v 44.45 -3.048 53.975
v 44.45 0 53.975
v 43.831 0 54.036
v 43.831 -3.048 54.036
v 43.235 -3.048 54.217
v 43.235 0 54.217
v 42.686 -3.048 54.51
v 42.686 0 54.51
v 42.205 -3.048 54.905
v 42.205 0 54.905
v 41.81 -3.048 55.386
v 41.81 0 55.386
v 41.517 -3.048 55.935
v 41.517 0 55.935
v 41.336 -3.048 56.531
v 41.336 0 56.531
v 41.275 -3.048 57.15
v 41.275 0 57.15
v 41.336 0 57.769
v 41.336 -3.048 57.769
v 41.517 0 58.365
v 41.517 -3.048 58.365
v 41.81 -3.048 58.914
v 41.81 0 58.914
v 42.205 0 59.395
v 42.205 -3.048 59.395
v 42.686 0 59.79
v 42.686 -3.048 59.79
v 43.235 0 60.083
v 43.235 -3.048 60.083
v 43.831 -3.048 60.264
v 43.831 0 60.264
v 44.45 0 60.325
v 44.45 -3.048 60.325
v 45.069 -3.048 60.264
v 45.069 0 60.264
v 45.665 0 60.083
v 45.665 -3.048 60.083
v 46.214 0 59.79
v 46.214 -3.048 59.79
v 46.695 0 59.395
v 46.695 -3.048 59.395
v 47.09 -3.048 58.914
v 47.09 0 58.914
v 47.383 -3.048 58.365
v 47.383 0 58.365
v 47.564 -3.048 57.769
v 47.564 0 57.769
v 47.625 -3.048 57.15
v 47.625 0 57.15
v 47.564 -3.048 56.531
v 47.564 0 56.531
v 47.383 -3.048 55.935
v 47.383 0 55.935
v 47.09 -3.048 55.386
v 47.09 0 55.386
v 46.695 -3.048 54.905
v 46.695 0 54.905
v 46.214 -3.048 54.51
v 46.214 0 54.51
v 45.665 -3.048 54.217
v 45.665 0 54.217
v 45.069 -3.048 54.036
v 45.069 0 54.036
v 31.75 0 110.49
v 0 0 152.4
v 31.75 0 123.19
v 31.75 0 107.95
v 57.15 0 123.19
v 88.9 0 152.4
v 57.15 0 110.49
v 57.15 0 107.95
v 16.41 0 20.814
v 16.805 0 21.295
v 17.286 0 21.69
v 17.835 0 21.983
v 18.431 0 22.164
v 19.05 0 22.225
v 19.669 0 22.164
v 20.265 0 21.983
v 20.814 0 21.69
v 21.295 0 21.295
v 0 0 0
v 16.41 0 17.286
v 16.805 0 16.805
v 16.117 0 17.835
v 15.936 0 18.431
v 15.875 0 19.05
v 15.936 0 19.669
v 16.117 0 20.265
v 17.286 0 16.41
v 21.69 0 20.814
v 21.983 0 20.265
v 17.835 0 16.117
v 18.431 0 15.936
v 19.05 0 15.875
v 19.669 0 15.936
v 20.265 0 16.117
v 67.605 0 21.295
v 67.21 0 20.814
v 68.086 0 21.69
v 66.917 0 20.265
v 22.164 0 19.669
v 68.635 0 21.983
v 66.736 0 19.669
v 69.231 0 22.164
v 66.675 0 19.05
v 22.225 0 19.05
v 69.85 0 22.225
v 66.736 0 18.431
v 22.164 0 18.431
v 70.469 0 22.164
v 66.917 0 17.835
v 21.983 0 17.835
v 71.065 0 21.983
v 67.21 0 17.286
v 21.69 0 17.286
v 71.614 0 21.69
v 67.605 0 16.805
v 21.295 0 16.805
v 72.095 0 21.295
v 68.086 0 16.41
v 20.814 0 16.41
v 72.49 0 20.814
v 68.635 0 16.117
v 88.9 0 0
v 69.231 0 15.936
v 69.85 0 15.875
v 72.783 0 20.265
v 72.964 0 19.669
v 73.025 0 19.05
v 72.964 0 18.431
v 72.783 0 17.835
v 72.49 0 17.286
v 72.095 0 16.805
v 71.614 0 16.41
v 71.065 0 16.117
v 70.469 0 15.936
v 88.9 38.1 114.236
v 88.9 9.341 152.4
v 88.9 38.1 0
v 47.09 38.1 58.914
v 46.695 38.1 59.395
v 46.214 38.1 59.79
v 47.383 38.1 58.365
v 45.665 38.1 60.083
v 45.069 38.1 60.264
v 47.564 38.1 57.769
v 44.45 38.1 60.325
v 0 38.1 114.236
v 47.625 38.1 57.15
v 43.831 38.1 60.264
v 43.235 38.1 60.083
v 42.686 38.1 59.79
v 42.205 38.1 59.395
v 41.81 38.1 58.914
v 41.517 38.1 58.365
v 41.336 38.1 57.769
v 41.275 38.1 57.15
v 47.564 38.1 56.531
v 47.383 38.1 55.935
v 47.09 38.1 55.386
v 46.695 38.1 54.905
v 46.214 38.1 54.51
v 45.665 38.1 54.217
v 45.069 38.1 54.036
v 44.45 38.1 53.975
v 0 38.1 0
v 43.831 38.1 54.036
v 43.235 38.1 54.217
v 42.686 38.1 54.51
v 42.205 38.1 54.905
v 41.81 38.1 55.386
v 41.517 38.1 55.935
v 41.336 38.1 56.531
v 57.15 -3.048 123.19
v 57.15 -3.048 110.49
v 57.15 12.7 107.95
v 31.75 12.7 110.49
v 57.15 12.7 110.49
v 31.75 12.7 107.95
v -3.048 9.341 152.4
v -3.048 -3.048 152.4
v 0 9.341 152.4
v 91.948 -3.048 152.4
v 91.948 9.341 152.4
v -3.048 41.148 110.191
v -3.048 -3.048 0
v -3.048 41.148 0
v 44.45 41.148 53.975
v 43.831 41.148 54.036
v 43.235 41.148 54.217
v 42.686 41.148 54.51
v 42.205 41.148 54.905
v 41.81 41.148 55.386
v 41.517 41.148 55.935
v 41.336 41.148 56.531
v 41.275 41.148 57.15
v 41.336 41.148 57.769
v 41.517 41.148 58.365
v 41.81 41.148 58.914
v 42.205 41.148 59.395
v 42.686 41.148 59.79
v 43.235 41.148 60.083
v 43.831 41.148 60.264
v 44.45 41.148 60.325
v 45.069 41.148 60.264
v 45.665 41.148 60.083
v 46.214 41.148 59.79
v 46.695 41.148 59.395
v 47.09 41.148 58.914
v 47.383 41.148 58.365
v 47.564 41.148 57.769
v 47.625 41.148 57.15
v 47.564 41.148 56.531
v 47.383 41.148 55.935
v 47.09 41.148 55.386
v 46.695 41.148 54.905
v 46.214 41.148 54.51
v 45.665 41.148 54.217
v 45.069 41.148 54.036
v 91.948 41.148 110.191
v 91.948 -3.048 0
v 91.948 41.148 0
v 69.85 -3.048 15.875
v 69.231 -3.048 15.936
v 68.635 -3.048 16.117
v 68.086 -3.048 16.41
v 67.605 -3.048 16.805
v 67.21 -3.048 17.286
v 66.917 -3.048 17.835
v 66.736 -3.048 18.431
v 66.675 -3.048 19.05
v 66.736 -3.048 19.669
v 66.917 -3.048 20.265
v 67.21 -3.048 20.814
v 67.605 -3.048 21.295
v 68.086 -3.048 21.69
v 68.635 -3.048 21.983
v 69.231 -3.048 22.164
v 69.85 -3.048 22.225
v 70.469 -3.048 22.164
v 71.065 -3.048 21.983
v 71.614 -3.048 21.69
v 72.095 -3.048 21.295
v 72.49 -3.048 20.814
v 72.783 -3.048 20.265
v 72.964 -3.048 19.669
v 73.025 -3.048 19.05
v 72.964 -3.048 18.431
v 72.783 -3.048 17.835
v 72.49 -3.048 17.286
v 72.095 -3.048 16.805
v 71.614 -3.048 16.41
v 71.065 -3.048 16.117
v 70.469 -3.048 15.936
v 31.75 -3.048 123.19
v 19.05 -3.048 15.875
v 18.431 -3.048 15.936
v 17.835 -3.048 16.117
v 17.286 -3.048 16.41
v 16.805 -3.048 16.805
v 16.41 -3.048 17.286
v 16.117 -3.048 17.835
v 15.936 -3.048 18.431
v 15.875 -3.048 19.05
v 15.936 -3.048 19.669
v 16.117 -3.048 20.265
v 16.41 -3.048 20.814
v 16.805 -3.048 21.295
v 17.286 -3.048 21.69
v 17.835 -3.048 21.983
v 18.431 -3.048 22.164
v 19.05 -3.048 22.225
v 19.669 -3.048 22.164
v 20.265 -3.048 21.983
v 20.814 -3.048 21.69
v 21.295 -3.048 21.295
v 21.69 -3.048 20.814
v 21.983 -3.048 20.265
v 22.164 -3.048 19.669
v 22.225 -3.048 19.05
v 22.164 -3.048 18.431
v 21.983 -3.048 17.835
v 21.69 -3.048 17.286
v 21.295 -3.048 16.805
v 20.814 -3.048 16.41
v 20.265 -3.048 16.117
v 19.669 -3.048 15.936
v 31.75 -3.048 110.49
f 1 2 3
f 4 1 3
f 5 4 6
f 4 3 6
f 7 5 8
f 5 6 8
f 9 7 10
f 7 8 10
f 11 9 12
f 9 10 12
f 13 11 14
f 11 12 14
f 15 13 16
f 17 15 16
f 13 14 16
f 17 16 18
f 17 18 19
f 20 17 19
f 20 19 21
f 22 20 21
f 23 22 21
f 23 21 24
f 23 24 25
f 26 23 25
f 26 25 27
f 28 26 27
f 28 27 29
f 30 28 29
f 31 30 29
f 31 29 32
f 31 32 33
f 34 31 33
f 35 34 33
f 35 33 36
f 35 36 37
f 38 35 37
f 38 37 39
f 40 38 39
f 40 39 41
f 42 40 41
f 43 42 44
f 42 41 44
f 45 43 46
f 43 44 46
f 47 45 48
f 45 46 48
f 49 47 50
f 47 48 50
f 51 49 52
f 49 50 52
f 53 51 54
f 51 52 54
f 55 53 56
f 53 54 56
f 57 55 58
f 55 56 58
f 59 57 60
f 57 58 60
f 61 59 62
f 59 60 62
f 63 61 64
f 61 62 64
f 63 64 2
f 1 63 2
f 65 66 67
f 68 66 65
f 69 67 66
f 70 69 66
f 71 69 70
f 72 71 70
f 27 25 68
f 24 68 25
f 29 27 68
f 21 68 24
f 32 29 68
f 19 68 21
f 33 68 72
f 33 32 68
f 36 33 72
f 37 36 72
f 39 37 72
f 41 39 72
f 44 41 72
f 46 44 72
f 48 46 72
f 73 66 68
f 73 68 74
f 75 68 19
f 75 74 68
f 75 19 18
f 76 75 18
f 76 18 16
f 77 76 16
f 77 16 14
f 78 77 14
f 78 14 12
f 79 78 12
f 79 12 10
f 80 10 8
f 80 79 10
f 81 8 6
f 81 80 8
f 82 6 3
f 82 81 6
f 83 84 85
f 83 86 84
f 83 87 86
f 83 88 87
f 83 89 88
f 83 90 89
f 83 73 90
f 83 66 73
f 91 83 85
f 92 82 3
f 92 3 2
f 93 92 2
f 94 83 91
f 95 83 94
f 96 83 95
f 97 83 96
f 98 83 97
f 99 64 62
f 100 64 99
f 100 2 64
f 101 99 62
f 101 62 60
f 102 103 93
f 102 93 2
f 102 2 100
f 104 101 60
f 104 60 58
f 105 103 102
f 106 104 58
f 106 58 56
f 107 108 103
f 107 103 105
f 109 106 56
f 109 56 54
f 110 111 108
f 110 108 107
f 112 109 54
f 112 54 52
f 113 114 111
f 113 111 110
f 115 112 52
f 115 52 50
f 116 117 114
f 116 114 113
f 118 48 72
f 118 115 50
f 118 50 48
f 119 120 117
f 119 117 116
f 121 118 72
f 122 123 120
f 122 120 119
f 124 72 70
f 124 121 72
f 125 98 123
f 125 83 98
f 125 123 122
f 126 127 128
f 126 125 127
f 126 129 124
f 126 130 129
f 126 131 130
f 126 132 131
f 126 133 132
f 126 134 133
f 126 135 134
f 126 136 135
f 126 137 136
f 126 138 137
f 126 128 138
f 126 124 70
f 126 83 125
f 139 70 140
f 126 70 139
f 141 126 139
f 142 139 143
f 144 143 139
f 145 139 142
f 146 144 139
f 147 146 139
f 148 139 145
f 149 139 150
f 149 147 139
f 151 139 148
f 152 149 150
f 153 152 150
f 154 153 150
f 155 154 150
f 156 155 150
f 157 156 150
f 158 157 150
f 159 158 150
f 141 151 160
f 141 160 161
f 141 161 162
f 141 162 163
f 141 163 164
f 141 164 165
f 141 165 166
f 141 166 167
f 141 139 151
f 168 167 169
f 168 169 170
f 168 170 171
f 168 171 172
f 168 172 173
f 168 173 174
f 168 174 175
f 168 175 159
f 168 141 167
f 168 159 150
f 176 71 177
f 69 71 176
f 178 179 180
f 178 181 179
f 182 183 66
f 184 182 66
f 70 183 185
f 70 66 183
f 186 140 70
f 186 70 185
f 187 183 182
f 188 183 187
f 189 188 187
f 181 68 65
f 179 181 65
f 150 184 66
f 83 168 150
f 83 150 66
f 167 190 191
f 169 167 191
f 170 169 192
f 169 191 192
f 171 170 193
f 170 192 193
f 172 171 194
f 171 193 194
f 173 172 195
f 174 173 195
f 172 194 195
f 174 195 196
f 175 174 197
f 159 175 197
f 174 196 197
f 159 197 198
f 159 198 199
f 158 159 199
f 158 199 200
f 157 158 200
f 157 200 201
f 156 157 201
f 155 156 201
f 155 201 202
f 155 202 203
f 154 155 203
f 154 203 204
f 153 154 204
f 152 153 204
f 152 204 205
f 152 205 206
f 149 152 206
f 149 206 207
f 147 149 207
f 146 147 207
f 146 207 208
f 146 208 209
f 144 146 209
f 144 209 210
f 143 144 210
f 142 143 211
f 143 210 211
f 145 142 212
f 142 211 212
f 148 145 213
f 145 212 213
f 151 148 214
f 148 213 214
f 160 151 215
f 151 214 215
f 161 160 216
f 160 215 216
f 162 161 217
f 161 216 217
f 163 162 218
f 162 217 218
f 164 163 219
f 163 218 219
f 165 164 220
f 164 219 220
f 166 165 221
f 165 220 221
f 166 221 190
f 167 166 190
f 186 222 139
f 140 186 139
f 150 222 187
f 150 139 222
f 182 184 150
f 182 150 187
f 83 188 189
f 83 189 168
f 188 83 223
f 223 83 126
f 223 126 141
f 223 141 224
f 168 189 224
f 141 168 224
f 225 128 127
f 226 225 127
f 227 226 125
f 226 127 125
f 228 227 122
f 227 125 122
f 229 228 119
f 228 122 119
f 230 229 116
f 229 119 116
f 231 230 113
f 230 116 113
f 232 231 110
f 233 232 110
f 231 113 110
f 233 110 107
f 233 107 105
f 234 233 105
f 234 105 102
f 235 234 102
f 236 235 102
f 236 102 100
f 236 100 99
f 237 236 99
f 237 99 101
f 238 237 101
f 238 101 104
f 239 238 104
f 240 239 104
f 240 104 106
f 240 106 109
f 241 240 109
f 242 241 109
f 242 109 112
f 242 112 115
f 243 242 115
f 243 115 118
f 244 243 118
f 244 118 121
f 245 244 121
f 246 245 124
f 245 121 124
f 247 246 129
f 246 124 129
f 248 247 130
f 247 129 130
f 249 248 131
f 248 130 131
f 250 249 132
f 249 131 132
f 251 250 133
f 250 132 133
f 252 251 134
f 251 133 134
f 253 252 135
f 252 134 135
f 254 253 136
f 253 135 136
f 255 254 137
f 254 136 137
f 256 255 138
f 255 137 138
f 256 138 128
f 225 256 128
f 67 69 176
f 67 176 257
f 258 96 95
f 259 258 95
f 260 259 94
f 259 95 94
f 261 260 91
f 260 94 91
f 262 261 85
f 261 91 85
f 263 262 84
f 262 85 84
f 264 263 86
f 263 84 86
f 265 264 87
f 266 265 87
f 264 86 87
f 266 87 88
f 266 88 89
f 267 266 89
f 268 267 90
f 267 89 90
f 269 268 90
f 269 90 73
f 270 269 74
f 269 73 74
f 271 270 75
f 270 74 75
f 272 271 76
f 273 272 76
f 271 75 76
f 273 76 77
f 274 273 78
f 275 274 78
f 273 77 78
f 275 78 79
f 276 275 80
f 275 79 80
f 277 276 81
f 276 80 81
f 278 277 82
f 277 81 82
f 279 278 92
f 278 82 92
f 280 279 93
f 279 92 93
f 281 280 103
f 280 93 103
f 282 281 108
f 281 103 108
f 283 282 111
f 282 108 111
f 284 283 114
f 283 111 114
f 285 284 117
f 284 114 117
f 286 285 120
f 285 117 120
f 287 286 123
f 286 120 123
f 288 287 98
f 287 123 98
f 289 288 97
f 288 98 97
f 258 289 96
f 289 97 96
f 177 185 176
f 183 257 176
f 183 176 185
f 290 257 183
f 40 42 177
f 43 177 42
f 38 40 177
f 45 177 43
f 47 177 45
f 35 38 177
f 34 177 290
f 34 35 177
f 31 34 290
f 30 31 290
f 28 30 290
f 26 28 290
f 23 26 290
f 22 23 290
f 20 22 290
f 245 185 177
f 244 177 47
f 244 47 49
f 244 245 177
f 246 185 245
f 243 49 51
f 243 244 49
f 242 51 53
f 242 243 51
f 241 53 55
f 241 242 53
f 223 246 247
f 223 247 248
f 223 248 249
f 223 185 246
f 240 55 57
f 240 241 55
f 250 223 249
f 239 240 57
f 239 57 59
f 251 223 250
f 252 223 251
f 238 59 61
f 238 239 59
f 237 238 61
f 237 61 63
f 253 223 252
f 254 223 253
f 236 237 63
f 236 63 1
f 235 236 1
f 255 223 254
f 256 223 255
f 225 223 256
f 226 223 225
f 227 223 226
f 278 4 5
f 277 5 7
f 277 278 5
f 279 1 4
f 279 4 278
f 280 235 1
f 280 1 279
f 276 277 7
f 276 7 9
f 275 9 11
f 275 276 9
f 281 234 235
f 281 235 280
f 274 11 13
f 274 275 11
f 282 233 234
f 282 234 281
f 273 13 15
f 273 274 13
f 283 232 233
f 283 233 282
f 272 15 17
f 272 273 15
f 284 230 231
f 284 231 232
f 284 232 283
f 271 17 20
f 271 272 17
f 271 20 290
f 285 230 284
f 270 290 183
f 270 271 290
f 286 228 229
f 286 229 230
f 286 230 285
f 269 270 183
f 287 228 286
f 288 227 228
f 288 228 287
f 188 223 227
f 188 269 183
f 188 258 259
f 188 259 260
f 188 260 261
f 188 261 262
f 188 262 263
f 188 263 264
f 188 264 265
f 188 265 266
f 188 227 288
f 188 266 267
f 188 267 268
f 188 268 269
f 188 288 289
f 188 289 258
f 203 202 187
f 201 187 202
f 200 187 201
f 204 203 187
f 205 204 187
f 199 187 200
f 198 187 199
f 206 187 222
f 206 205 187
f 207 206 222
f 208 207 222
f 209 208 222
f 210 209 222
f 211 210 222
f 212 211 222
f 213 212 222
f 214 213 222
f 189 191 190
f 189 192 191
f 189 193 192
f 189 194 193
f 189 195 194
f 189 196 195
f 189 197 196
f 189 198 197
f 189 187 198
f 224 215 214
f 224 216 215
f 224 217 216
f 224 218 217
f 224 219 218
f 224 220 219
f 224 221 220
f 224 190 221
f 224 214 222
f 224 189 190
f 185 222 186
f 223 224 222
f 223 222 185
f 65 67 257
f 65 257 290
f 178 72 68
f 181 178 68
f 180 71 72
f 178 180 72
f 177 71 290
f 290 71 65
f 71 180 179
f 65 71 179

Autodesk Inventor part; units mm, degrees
ref_plane "YZ Plane" through (0, 0, 0) normal (1, 0, 0) x (0, 1, 0)
ref_plane "XZ Plane" through (0, 0, 0) normal (0, 1, 0) x (-1, 0, 0)
sketch "Sketch1" plane through (0, 0, 0) normal (0, 0, 1) x (1, 0, 0)
  line L0 (0, 0) -> (88.9, 0)
  line L1 (88.9, 0) -> (88.9, 38.1)
  line L2 (88.9, 38.1) -> (0, 38.1)
  line L3 (0, 38.1) -> (0, 0)
  line L4 (-3.048, 41.148) -> (91.948, 41.148)
  line L5 (91.948, 41.148) -> (91.948, -3.048)
  line L6 (91.948, -3.048) -> (-3.048, -3.048)
  line L7 (-3.048, -3.048) -> (-3.048, 41.148)
  dimension "d0" = 88.9
  dimension "d1" = 38.1
  dimension "d2" = 3.048
extrude "Extrusion1" add sketch "Sketch1" along normal blind 152.4
ref_plane "Work Plane1" through (-3.048, 41.148, 152.4) normal (0, 0.7986, 0.6018) x (-1, 0, 0)
sketch "Sketch2" plane through (-3.048, 41.148, 152.4) normal (0, 0.7986, 0.6018) x (-1, 0, 0)
  line L0 (-144.4625, 77.7875) -> (65.0875, 77.7875)
  line L1 (65.0875, 77.7875) -> (65.0875, -49.2125)
  line L2 (65.0875, -49.2125) -> (-144.4625, -49.2125)
  line L3 (-144.4625, -49.2125) -> (-144.4625, 77.7875)
  point P0 (-3.048, -96.9486)
  dimension "d8" = 127
extrude "Extrusion2" cut sketch "Sketch2" against normal blind 25.4
sketch "Sketch5" plane through (0, 0, 0) normal (0, 1, 0) x (1, 0, 0)
  line L0 (0, 0) -> (0, -152.4) projected
  line L1 (88.9, -152.4) -> (0, -152.4) projected
  line L2 (31.75, -110.49) -> (57.15, -110.49)
  line L3 (57.15, -110.49) -> (57.15, -107.95)
  line L4 (57.15, -107.95) -> (31.75, -107.95)
  line L5 (31.75, -107.95) -> (31.75, -110.49)
  line L6 (44.45, -152.4) -> (44.45, -68.5497) construction
  dimension "d21" = 25.4
  dimension "d22" = 2.54
  dimension "d23" = 44.45
  dimension "d24" = 31.75
extrude "Extrusion4" add sketch "Sketch5" along normal blind 12.7
sketch "Sketch7" plane through (0, 0, 0) normal (0, 1, 0) x (1, 0, 0)
  line L0 (57.15, -110.49) -> (31.75, -110.49) projected
  line L1 (31.75, -110.49) -> (57.15, -110.49)
  line L2 (57.15, -110.49) -> (57.15, -123.19)
  line L3 (57.15, -123.19) -> (31.75, -123.19)
  line L4 (31.75, -123.19) -> (31.75, -110.49)
  dimension "d36" = 12.7
  dimension "d37" = 25.4
  dimension "d38" = 0
extrude "Extrusion5" cut sketch "Sketch7" against normal blind 25.4
sketch "Sketch9" plane through (-3.048, -3.048, 0) normal (0, -1, 0) x (1, 0, 0)
  line L0 (0, 0) -> (0, 152.4) projected
  line L1 (94.996, 0) -> (0, 0) projected
  circle A0 centre (22.098, 19.05) radius 3.175
  circle A1 centre (72.898, 19.05) radius 3.175
  point P0 (3.048, 0)
  dimension "d59" = 6.35
  dimension "d60" = 19.05
  dimension "d61" = 22.098
  dimension "d62" = 6.35
  dimension "d63" = 50.8
hole "holePair" at (19.05, -3.048, 19.05) at (69.85, -3.048, 19.05) direction (0, 1, 0) diameter 6.35 depth 25.4 tip angle 118
sketch "Sketch10" plane through (-3.048, -3.048, 0) normal (0, -1, 0) x (1, 0, 0)
  circle A0 centre (22.098, 19.05) radius 3.175 projected
  circle A1 centre (72.898, 19.05) radius 3.175 projected
  line L0 (0, 0) -> (0, 152.4) projected
  line L1 (22.098, 19.05) -> (72.898, 19.05) construction
  circle A2 centre (47.498, 57.15) radius 3.5015
  point P0 (3.048, 0)
  dimension "d74" = 38.1
hole "Hole5" at (44.45, -3.048, 57.15) direction (0, 1, 0) diameter 6.35 end through all
properties part number "2p1hh" material "Steel, Galvanized"
